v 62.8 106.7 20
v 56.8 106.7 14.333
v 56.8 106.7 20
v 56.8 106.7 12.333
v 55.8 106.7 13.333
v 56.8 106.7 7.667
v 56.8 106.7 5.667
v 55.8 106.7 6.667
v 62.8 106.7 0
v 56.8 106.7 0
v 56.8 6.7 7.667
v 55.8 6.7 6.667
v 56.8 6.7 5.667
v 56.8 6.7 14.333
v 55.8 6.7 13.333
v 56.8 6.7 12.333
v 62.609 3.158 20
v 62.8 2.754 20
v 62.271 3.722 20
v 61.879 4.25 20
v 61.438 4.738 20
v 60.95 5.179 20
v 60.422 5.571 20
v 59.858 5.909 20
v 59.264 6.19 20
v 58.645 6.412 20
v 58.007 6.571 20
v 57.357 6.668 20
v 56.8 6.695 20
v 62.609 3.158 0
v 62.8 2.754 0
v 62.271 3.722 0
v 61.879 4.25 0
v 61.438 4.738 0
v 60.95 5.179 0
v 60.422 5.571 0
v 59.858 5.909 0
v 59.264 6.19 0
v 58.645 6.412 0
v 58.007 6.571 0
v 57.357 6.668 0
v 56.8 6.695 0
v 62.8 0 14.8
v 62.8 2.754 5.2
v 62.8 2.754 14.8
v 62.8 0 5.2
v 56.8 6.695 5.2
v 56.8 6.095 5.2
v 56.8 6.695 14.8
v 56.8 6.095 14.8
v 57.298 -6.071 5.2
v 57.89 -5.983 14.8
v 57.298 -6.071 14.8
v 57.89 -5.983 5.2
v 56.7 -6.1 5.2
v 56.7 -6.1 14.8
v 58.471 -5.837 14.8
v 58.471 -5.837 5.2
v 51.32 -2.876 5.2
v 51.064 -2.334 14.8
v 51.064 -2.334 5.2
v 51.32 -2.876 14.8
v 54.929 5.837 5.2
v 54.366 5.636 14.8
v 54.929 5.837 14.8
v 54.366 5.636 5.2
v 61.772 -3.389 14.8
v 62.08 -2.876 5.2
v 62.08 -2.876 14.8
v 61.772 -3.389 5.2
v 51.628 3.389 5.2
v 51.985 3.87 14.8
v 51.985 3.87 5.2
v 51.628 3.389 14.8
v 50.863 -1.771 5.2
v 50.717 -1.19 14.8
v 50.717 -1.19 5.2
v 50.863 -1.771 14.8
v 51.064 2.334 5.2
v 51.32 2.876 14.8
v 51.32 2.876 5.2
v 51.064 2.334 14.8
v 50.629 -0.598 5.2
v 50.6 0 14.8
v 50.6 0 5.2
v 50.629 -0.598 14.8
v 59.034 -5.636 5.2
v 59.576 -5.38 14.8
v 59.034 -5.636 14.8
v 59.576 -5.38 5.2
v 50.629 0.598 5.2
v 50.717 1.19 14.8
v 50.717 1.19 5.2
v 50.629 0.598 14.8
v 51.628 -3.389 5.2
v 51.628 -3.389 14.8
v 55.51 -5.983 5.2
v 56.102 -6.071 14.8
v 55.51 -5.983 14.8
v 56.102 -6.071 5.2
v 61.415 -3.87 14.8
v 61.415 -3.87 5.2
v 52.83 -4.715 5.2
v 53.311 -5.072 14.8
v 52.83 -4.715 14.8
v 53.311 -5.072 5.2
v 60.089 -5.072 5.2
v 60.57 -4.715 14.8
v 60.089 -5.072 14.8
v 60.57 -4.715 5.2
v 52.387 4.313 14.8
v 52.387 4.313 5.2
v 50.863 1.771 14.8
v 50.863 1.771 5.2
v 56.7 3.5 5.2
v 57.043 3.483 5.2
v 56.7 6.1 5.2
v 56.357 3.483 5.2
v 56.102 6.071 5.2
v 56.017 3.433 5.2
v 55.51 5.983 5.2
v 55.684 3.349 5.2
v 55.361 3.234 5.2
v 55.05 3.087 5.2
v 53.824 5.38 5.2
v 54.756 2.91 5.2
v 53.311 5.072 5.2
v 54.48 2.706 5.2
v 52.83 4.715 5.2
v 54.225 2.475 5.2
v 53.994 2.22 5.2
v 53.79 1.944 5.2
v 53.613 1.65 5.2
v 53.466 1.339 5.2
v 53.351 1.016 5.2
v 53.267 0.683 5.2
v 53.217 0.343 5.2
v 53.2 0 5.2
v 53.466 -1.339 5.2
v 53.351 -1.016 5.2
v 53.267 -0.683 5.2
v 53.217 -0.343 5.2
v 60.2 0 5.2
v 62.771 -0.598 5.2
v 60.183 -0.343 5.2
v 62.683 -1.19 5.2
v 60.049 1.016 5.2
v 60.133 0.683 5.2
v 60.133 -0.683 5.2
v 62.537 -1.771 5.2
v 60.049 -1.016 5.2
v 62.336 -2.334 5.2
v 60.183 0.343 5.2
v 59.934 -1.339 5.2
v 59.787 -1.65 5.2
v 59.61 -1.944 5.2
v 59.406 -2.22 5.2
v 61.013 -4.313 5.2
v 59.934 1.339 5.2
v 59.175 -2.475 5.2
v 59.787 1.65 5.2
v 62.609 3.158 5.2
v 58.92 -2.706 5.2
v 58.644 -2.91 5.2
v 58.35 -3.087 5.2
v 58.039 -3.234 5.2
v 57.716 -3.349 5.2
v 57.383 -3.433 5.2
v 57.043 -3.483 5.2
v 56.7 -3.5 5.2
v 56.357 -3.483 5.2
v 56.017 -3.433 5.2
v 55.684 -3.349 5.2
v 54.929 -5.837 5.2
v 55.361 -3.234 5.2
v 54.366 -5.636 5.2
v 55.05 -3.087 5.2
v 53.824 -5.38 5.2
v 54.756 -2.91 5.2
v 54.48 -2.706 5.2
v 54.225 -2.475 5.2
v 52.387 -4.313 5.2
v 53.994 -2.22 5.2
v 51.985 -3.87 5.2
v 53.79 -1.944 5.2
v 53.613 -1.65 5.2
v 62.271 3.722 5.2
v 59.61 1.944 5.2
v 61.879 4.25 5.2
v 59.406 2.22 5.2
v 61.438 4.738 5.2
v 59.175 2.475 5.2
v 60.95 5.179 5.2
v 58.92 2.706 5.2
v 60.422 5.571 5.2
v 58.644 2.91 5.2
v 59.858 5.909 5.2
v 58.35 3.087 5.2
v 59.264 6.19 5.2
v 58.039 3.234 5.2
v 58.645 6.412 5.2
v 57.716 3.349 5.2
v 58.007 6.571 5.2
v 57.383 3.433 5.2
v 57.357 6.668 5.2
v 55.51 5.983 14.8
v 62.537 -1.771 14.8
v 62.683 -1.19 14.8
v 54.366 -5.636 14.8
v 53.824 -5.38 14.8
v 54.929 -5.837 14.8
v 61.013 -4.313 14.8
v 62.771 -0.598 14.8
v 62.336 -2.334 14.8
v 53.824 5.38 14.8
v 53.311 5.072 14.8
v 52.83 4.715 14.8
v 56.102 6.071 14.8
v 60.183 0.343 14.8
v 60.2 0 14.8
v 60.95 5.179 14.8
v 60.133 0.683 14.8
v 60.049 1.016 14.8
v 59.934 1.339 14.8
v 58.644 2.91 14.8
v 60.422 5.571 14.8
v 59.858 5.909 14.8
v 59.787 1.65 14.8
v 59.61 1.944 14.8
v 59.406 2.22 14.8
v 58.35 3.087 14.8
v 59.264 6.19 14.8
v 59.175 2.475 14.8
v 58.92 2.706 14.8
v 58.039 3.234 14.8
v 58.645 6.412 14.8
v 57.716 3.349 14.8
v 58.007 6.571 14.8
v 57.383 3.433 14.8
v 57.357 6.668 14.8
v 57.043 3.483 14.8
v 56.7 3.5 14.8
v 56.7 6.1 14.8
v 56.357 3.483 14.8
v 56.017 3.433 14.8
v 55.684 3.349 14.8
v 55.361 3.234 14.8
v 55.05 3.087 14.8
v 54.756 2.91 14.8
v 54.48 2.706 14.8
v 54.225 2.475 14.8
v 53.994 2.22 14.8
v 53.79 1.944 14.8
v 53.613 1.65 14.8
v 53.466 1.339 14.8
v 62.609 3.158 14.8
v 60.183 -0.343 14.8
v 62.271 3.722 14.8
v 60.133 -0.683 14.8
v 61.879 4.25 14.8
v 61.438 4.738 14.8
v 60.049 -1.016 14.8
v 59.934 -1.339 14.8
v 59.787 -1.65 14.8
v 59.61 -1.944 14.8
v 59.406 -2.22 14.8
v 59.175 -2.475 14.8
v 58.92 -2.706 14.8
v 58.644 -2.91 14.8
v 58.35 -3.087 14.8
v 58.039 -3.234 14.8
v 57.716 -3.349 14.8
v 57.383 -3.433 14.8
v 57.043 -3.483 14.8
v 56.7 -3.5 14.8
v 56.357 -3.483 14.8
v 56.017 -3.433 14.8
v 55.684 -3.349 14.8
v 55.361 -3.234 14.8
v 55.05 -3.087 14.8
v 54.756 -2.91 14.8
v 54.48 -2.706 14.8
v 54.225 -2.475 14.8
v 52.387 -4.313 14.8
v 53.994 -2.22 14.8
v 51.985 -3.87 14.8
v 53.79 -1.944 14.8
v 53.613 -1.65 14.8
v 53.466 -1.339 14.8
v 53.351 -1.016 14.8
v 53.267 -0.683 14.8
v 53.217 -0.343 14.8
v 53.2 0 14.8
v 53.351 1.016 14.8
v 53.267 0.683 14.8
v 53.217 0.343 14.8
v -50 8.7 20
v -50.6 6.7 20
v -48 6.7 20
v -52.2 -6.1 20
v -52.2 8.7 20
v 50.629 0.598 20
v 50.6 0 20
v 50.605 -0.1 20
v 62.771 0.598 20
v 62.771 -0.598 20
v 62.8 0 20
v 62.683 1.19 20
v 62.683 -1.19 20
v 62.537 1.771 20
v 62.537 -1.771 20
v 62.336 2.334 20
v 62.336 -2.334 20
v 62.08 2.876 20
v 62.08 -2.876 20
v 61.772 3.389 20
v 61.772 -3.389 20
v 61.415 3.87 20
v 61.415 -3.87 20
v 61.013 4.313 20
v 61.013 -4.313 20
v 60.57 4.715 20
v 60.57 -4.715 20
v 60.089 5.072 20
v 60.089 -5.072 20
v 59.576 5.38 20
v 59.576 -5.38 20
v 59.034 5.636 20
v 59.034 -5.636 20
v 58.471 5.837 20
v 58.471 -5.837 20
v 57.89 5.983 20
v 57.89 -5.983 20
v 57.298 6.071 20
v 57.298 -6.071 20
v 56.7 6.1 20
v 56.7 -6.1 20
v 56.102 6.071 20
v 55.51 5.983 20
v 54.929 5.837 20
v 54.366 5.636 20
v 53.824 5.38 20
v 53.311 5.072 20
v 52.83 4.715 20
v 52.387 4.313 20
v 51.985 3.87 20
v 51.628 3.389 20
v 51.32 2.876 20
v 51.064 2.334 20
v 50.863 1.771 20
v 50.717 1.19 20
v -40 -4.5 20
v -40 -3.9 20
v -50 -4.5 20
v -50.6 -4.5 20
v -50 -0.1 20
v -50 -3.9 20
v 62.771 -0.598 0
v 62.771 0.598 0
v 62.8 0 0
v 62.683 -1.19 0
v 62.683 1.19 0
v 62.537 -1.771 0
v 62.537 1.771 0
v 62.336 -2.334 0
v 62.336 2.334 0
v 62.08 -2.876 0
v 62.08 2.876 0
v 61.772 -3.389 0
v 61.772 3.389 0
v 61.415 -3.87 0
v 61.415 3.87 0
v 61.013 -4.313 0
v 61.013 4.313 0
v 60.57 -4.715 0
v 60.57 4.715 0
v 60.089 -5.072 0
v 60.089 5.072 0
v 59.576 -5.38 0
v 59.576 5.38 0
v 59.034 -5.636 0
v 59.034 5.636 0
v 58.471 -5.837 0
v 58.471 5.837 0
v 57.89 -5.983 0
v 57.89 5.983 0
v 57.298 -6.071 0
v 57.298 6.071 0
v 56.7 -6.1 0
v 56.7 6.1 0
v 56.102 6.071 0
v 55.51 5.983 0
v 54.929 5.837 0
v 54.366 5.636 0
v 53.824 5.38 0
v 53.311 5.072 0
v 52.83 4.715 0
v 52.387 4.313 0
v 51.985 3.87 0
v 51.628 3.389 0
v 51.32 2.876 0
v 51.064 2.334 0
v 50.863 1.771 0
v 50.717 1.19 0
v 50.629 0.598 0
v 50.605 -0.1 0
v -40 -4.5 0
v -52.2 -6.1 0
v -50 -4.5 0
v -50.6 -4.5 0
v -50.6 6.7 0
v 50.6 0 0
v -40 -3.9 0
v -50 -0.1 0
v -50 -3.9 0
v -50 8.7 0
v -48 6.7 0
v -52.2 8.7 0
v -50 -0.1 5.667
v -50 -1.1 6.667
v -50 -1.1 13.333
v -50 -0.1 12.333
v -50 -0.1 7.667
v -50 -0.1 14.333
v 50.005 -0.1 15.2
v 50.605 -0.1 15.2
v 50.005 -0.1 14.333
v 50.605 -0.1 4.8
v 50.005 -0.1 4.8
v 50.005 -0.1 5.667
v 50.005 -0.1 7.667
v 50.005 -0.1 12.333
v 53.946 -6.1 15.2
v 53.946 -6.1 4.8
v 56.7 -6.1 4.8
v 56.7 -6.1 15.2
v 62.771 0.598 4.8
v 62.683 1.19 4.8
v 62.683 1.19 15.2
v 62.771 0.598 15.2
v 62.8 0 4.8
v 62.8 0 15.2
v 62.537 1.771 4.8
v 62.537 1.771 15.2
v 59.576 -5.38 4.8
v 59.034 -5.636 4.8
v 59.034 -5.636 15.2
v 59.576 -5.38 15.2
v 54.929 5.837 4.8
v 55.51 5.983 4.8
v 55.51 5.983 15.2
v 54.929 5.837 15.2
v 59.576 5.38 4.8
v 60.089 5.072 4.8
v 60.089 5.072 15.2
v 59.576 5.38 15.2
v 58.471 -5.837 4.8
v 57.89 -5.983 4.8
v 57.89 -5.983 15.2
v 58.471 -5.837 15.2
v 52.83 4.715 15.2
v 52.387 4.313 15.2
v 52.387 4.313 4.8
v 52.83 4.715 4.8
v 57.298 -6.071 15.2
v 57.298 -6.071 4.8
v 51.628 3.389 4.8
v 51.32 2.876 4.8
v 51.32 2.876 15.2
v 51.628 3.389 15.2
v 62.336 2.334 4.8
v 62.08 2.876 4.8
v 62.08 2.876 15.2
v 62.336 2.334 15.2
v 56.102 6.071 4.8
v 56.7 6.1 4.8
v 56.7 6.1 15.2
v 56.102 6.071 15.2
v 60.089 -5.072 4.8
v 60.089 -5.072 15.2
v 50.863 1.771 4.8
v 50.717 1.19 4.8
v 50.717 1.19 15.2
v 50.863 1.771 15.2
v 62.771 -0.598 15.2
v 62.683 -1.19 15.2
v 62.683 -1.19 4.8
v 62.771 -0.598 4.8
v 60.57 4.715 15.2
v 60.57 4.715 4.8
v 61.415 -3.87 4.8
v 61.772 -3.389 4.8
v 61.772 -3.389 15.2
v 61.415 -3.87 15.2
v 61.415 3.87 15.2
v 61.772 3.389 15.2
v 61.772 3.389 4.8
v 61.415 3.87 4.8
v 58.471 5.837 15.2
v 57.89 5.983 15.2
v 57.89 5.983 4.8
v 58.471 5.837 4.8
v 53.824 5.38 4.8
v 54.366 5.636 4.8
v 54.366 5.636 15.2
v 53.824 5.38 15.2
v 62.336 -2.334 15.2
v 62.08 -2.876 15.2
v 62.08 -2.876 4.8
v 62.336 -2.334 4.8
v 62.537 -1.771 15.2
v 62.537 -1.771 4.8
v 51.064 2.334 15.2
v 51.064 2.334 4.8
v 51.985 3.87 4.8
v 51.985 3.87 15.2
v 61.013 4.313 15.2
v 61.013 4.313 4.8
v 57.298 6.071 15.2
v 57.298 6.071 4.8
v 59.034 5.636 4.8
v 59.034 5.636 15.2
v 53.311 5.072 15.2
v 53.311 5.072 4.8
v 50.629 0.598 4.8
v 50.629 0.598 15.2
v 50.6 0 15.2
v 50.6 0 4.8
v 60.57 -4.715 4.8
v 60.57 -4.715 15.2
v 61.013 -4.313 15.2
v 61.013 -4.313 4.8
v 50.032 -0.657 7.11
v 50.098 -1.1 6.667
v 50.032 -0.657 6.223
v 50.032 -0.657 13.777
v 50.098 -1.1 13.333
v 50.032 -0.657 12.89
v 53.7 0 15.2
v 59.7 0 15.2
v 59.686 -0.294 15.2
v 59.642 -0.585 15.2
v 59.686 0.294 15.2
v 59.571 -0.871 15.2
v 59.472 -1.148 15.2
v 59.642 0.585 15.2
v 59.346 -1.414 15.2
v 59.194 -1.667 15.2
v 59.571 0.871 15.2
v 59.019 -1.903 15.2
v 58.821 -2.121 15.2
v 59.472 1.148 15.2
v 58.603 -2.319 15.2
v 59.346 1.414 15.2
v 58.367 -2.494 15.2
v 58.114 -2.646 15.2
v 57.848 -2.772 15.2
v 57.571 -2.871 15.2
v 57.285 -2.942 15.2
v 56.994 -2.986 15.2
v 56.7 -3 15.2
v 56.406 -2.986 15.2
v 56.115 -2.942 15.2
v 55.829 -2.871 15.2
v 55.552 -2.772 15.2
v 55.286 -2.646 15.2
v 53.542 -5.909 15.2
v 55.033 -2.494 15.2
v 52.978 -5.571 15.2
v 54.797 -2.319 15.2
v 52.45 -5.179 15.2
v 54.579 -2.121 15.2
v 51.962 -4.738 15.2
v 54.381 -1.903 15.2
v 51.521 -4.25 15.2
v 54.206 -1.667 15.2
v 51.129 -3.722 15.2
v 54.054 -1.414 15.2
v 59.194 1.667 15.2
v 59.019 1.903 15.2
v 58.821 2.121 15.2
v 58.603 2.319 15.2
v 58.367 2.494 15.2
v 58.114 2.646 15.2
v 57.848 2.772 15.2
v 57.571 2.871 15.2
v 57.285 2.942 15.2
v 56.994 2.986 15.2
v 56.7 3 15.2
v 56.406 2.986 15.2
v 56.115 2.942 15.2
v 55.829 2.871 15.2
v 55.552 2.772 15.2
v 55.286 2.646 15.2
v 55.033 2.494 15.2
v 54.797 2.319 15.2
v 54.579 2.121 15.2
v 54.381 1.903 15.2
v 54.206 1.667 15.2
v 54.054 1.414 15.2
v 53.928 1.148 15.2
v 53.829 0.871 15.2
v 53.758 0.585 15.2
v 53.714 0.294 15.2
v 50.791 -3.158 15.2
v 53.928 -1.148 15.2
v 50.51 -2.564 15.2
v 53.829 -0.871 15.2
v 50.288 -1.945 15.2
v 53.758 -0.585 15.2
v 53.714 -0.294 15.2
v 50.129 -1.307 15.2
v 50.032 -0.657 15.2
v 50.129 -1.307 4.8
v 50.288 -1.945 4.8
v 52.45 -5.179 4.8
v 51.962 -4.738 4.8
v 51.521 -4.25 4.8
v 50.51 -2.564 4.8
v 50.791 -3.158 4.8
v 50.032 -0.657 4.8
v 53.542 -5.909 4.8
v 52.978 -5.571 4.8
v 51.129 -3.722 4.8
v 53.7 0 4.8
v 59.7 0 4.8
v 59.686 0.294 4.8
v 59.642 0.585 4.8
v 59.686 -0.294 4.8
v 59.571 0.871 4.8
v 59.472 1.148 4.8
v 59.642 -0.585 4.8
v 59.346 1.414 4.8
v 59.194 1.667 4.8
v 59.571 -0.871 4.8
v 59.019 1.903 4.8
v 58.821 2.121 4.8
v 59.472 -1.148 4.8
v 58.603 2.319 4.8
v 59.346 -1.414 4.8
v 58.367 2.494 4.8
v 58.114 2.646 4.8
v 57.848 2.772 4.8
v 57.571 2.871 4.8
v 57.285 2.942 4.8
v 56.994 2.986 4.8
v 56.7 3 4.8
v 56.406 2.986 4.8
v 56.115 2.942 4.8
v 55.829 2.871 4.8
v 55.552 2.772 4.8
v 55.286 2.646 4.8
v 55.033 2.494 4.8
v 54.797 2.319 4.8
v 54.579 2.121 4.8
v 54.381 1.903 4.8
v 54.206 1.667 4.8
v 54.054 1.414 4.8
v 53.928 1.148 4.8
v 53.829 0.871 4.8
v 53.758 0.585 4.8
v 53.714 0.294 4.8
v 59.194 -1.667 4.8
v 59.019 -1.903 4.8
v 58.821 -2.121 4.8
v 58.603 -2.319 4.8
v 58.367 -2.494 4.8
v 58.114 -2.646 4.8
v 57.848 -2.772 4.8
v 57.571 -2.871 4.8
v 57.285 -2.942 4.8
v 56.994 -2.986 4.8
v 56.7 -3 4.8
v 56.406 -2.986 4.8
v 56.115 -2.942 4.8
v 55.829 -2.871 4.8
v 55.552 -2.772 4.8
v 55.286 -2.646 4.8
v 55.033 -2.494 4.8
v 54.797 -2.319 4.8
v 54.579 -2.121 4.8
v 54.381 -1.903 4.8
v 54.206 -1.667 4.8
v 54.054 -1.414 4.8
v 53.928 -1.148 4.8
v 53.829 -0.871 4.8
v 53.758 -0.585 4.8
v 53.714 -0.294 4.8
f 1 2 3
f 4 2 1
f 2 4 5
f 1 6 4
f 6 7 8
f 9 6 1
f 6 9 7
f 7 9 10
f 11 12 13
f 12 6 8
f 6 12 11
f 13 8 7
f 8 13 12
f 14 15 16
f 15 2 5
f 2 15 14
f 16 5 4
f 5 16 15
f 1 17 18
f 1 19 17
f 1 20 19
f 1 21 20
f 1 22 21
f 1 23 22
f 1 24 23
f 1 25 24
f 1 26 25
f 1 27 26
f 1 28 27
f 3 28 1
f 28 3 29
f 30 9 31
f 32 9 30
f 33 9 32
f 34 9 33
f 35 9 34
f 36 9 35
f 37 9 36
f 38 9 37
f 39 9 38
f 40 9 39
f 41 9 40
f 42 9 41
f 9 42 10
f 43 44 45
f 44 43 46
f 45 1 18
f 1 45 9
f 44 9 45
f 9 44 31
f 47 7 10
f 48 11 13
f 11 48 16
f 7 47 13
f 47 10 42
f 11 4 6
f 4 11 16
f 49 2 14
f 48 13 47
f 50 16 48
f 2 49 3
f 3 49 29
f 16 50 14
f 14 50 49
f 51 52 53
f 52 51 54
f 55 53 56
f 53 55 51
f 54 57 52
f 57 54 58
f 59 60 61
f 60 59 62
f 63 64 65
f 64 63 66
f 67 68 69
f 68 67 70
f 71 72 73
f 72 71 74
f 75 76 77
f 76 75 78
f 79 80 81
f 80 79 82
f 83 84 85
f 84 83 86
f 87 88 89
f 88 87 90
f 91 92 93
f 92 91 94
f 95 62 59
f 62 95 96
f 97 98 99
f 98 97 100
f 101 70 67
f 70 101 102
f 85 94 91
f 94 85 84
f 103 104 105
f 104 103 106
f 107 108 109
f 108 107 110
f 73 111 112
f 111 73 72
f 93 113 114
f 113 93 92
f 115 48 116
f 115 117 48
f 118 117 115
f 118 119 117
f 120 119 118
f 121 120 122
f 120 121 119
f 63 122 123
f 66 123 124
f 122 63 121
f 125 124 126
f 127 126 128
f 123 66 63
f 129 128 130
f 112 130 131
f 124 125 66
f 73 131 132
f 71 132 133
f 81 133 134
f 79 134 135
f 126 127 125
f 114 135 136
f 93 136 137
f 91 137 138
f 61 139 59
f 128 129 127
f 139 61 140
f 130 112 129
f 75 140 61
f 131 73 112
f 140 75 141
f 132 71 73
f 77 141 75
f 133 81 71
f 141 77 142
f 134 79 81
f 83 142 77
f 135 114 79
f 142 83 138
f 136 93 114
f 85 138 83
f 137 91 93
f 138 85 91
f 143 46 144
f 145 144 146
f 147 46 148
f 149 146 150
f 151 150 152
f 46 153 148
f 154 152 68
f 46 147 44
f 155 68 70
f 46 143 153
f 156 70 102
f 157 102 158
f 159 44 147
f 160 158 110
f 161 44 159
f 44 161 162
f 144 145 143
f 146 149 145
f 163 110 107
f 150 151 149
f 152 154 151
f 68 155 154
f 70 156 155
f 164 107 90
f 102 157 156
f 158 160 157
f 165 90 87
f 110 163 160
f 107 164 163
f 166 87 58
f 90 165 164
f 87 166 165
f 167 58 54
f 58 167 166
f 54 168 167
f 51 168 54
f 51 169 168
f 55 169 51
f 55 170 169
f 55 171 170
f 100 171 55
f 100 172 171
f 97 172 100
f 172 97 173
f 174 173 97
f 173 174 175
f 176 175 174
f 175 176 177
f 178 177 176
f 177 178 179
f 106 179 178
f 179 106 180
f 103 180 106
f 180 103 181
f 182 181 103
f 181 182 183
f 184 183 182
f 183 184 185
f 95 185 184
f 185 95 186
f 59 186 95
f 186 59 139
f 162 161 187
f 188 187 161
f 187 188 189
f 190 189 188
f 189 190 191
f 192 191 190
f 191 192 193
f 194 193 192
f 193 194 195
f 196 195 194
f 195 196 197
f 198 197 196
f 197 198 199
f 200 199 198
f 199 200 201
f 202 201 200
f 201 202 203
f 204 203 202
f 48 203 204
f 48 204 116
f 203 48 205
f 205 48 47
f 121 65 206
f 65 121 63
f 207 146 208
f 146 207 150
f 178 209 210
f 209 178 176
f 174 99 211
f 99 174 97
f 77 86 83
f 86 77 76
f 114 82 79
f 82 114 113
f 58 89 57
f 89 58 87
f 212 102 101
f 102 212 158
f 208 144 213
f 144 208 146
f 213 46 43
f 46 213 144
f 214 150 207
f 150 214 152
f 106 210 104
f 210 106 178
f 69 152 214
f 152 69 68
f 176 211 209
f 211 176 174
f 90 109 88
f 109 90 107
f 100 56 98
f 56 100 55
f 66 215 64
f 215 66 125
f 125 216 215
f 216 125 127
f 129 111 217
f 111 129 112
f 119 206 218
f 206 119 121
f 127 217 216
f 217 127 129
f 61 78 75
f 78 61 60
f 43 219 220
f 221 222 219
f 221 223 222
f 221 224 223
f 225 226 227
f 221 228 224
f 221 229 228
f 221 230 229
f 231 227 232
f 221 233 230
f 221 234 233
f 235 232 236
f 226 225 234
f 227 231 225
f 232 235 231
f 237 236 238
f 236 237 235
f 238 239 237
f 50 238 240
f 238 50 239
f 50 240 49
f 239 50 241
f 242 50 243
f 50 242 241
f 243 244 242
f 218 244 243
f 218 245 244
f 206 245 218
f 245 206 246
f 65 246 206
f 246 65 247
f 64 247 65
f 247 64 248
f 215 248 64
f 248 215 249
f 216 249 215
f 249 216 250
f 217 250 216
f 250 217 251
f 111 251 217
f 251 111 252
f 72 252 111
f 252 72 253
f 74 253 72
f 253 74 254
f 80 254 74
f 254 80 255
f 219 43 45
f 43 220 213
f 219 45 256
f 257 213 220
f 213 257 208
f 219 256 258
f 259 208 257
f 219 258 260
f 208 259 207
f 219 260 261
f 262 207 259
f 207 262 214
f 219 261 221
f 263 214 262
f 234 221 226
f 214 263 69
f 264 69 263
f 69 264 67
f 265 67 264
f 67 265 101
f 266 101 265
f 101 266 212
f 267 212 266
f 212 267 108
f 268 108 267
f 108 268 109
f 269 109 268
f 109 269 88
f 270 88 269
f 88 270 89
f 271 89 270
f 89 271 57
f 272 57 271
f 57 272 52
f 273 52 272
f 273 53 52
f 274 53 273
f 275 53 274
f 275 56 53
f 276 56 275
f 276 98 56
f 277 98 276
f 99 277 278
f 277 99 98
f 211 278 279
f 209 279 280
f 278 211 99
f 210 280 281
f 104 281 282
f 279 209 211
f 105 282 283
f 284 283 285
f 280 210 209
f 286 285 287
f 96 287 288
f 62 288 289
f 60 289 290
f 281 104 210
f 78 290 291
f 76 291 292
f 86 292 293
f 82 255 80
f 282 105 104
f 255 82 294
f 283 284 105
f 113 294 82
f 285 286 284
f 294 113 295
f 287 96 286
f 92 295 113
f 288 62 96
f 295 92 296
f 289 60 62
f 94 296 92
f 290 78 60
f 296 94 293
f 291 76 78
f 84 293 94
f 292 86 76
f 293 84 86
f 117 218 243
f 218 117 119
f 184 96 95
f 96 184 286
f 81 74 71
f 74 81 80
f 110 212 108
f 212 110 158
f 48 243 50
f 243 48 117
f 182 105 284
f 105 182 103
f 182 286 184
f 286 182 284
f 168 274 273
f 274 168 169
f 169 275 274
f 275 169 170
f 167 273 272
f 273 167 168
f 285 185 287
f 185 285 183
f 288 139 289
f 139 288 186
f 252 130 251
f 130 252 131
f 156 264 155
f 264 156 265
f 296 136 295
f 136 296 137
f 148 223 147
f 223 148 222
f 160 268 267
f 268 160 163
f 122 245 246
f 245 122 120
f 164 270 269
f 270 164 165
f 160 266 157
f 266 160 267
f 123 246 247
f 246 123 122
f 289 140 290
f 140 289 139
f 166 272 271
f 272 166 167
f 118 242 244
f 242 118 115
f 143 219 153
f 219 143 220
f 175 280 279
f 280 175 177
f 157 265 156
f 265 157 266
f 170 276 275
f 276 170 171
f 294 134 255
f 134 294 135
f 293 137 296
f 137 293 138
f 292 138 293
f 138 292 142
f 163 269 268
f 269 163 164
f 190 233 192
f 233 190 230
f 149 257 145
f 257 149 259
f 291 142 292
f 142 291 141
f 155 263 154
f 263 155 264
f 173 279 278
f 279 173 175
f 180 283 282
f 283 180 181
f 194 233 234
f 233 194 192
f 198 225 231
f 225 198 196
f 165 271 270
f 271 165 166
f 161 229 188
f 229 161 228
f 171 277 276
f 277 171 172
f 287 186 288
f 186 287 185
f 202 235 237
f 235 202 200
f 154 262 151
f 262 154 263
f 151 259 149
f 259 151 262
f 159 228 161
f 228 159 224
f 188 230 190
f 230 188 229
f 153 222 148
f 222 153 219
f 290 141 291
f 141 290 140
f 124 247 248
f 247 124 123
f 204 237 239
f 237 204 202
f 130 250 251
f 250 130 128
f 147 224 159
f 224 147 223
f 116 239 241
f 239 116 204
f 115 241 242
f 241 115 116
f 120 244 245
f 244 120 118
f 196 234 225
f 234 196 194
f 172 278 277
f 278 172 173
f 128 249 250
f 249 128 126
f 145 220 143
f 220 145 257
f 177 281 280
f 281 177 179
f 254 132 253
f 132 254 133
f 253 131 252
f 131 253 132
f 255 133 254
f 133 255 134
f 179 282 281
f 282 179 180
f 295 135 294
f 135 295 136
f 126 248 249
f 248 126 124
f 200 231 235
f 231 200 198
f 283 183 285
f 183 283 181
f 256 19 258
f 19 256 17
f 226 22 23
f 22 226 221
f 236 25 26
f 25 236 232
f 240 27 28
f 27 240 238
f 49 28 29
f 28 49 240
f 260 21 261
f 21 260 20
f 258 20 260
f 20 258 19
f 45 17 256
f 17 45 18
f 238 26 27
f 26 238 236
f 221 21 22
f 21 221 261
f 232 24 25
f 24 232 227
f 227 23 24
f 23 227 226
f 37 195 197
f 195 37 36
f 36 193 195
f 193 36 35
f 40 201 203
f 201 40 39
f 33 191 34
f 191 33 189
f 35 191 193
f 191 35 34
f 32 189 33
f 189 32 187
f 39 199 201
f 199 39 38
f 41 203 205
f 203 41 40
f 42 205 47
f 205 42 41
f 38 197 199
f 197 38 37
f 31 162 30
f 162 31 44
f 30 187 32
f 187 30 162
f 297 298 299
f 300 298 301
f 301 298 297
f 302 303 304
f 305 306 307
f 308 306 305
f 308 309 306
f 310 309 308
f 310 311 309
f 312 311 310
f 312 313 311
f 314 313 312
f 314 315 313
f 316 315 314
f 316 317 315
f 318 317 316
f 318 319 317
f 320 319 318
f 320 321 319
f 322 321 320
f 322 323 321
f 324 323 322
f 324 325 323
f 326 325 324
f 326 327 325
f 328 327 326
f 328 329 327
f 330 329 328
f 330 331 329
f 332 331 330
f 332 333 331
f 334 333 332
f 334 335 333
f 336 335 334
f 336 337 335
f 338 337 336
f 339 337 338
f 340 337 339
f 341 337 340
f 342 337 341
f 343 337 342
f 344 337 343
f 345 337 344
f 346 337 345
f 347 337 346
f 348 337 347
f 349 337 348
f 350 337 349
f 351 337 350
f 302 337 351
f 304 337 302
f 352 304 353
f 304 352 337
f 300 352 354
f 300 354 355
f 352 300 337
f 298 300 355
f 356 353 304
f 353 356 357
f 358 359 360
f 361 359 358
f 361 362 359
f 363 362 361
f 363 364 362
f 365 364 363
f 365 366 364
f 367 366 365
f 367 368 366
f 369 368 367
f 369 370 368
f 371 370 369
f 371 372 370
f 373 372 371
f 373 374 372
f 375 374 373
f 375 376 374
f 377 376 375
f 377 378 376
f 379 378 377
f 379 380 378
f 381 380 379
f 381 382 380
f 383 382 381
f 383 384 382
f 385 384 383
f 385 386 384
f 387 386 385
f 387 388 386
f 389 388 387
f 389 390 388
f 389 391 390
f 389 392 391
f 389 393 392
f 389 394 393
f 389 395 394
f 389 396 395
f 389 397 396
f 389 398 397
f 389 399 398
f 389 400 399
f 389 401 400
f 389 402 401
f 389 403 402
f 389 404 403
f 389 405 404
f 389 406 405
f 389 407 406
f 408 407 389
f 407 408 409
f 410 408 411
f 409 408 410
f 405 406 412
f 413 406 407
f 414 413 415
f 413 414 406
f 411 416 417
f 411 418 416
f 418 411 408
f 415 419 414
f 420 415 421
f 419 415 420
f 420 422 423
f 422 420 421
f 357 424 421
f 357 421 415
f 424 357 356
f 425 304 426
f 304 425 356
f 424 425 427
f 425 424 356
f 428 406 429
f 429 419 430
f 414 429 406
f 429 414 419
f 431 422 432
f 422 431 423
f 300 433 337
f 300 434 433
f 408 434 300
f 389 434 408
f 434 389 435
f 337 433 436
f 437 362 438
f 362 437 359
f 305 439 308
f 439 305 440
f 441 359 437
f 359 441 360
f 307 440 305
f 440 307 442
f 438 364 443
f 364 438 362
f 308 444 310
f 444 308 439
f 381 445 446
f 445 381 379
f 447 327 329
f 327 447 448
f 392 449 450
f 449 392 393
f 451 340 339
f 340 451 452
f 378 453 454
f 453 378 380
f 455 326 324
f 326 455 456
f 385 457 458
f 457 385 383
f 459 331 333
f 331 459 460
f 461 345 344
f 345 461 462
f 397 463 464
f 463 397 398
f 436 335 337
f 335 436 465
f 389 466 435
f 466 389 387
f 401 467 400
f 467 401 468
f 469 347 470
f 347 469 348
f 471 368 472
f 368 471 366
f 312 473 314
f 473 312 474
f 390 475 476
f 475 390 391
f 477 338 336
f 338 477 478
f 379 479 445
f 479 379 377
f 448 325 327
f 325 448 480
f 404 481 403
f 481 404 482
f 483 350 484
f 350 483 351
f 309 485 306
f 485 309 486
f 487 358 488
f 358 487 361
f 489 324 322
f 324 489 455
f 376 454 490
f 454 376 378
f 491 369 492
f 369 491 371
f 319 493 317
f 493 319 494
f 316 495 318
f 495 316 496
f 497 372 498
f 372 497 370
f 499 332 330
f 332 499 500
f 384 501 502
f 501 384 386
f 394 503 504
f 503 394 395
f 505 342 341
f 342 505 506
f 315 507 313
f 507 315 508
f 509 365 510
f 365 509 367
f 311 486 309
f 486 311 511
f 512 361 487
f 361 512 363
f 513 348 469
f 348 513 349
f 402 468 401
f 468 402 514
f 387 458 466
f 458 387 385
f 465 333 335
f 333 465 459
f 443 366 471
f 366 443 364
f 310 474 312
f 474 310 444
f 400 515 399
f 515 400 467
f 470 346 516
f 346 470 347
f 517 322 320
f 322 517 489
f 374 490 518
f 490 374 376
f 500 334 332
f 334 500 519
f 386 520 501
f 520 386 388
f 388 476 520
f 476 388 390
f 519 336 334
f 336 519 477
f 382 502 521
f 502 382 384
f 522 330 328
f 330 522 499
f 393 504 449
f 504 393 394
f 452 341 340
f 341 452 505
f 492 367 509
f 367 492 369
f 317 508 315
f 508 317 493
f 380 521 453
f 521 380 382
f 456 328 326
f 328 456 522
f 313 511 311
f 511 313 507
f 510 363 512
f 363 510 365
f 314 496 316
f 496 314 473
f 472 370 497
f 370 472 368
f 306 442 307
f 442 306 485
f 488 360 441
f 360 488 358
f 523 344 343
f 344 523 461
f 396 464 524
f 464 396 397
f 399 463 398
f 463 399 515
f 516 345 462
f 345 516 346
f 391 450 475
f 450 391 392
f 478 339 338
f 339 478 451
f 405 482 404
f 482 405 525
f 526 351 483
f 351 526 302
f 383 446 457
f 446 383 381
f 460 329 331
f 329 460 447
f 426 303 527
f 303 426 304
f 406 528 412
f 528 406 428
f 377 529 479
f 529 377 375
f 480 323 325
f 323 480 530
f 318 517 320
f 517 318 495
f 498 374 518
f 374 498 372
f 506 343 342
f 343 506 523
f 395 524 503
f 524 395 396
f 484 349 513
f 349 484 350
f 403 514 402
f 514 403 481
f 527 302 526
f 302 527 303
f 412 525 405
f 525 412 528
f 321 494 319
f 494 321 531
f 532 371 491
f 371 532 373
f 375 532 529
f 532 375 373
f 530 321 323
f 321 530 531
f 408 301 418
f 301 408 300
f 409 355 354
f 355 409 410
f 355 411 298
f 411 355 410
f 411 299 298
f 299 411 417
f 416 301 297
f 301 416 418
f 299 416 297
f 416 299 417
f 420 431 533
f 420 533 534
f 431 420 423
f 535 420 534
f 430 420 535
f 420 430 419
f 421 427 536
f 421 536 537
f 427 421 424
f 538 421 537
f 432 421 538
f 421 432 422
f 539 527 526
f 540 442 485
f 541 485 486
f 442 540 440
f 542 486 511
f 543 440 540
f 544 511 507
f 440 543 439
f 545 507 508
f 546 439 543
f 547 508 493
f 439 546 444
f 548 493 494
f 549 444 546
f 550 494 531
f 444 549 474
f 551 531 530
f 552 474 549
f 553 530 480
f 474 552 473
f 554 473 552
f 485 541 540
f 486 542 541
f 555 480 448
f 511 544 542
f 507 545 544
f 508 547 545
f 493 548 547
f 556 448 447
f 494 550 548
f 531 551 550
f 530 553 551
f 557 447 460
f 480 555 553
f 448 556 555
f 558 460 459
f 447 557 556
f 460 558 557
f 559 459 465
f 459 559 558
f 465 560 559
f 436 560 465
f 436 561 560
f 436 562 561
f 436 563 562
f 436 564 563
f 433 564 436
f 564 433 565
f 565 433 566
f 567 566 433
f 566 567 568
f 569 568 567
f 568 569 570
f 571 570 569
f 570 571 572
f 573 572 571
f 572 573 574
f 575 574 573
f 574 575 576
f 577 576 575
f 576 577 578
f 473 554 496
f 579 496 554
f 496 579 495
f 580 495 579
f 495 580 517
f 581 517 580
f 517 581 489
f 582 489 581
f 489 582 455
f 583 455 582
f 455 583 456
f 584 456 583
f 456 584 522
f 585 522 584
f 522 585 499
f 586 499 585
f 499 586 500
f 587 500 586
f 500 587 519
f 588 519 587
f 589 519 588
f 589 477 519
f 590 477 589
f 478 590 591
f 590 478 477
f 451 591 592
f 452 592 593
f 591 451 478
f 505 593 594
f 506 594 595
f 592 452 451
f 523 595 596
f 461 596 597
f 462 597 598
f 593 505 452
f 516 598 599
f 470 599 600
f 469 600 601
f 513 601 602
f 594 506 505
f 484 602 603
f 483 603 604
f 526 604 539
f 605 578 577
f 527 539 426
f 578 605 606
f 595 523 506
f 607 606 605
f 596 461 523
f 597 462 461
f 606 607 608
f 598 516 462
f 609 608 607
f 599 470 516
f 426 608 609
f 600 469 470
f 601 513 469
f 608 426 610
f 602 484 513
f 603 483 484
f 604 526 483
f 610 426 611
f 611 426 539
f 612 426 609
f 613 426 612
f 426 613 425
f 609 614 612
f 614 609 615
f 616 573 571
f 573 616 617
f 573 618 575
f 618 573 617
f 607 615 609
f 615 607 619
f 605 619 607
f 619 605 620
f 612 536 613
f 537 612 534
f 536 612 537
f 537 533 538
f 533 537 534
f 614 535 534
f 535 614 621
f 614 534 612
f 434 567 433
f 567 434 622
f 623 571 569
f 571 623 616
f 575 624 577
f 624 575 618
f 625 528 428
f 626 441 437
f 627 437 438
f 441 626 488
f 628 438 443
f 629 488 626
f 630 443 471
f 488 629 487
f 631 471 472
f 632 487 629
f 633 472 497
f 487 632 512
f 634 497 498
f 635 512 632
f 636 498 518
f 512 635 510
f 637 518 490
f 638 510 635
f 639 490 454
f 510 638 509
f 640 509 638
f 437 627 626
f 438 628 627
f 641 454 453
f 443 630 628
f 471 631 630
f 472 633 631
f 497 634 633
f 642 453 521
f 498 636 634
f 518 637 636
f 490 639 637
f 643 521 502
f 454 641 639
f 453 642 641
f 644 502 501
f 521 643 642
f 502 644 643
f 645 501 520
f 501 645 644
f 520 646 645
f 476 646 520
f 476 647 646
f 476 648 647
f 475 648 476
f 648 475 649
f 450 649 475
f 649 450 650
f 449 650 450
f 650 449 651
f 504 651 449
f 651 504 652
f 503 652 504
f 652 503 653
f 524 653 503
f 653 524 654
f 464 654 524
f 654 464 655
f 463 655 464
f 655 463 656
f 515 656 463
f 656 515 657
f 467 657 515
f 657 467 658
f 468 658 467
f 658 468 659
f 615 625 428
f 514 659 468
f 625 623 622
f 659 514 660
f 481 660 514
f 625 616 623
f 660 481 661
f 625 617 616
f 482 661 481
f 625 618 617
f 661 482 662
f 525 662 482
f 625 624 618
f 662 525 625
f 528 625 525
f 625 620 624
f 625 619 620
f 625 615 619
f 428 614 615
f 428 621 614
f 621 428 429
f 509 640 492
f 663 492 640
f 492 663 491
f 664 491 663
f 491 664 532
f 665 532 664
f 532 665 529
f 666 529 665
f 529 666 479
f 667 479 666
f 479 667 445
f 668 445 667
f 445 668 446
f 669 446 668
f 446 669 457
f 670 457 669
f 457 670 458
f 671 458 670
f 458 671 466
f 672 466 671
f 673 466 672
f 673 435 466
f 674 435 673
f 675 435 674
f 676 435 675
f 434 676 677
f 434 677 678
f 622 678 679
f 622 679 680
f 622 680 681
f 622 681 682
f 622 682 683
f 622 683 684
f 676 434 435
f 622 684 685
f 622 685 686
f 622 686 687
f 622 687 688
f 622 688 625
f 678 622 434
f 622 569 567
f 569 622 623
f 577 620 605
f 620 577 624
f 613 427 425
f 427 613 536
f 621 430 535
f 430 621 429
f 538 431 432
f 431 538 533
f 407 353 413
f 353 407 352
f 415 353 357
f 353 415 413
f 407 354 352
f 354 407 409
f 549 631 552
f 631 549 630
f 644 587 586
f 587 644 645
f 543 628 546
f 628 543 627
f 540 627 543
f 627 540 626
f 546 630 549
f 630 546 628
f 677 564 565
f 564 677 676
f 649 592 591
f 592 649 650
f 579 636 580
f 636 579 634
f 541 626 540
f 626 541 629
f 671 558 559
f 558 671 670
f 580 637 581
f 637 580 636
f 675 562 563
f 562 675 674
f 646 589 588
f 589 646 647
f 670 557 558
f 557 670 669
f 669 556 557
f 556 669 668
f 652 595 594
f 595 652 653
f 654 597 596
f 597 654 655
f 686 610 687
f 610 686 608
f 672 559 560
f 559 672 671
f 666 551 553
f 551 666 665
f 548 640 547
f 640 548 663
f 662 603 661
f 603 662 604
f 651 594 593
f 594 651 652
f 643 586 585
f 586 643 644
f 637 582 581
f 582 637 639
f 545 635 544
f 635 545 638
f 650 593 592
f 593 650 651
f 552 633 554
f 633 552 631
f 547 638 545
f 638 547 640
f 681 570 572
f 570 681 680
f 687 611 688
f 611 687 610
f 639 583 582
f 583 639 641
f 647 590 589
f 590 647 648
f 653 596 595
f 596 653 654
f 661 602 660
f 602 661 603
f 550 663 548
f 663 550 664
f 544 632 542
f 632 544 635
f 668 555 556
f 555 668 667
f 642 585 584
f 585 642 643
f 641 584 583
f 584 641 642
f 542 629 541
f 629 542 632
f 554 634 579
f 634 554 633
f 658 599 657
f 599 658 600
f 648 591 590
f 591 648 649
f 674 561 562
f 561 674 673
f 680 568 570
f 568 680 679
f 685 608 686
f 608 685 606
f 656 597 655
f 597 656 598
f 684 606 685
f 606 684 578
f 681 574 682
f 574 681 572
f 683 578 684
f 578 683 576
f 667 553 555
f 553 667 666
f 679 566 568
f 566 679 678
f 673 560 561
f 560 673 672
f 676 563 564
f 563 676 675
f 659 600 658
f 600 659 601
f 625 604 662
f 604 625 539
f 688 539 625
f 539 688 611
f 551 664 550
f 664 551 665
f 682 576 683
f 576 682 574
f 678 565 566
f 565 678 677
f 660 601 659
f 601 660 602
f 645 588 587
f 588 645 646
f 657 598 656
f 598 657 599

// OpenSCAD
//!OpenSCAD

// The useable length of the Clip
Clip_Length = 100;
// The height of the clip
Clip_Height = 20;
// The thickness of one of the two arms
Arm_Thickness = 6;

// Your extrusion width (Width of the molten plastic trace of your nozzle - Usally your nozzle diameter)
Extrusion_Width = 0.4;
// Your layer height
Layer_Height = 0.2;

// The amount of noses and slots to create
Amount_Noses = 2;
// The length how far a nose is standing out
Noses_Size = 1;

// The angle how far the clip is opened
Opening_Angle = 90;

// How much the clip has to be bowed to snap (I recommend 2mm for PLA and 3mm for ABS)
Clip_Overstand = 2;

//Circle Resolution
$fn = 64;

translate([0,0,Clip_Height/2])
union() {
    // Upper part
    translate([Clip_Length/2 + Arm_Thickness + 1.75*Extrusion_Width, 0, 0])
        rotate([0, 0, -Opening_Angle])
            translate([-Clip_Length/2 - Arm_Thickness - 1.75*Extrusion_Width, 0, 0])
                difference() {
                    union() {
                        translate([(Arm_Thickness + 1.75*Extrusion_Width)/2, Arm_Thickness/2 + Extrusion_Width/4, 0])
                            cube([Clip_Length + Arm_Thickness + 1.75*Extrusion_Width, Arm_Thickness, Clip_Height], center=true);
    
                        for(i = [1 : 1 : Amount_Noses]) 
                            translate([0, Extrusion_Width/4, -Clip_Height/2 + i*Clip_Height/(Amount_Noses + 1)])
                                rotate([45,0,0])
                                    cube([Clip_Length, sqrt(2)*Noses_Size, sqrt(2)*Noses_Size], center=true);
    
                        translate([Clip_Length/2 + Arm_Thickness + 1.75*Extrusion_Width, 0, 0])
                            cylinder(r = Arm_Thickness + Extrusion_Width/4, h = Clip_Height/2-2*Layer_Height, center=true);
                    }
                    
                    translate([Clip_Length/2 + Arm_Thickness + 1.75*Extrusion_Width, 0, 0])
                        cylinder(r = Arm_Thickness/2 + 1.25*Extrusion_Width, h = Clip_Height/2-2*Layer_Height, center=true);
                    
                    translate([Clip_Length/2 + Arm_Thickness + 1.75*Extrusion_Width, 0, 0.375*Clip_Height - Layer_Height/2])
                            cylinder(r = Arm_Thickness + 1.75*Extrusion_Width, h = Clip_Height/4 + Layer_Height, center=true);
                    
                    translate([Clip_Length/2 + Arm_Thickness + 1.75*Extrusion_Width, 0, -0.375*Clip_Height + Layer_Height/2])
                            cylinder(r = Arm_Thickness + 1.75*Extrusion_Width, h = Clip_Height/4 + Layer_Height, center=true);
                }
    
    // Lower part
    difference() {
        union() {
            translate([(Arm_Thickness + 1.75*Extrusion_Width)/2, -Arm_Thickness/2 - Extrusion_Width/4, 0])
                cube([Clip_Length + Arm_Thickness + 1.75*Extrusion_Width, Arm_Thickness, Clip_Height], center=true);
            
            translate([Clip_Length/2 + Arm_Thickness + 1.75*Extrusion_Width, 0, 0])
                cylinder(r = Arm_Thickness + Extrusion_Width/4, h = Clip_Height, center=true);
            
            translate([-(Clip_Length + 5.5*Extrusion_Width)/2, -Arm_Thickness + 1.75*Extrusion_Width, 0])
                cube([5.5*Extrusion_Width, 4*Extrusion_Width, Clip_Height], center=true);
            
            translate([-Clip_Length/2 - 3.5*Extrusion_Width, 0.75*Extrusion_Width, 0])
                cube([4*Extrusion_Width, 2*Arm_Thickness + 2*Extrusion_Width, Clip_Height], center=true);
            
            translate([-Clip_Length/2 - 5.5*Extrusion_Width, Arm_Thickness + 1.75*Extrusion_Width , 0])
                polyhedron( points = [
                                [0, 0, -Clip_Height/2], 
                                [Clip_Overstand + 5.5*Extrusion_Width, 0, -Clip_Height/2], 
                                [5.5*Extrusion_Width, Clip_Overstand, -Clip_Height/2], 
                                [0, Clip_Overstand, -Clip_Height/2], 
                                [0, 0, Clip_Height/2], 
                                [Clip_Overstand + 5.5*Extrusion_Width, 0, Clip_Height/2], 
                                [5.5*Extrusion_Width, Clip_Overstand, Clip_Height/2], 
                                [0, Clip_Overstand, Clip_Height/2]], 
                            triangles = [[0,1,2],[0,2,3],[4,7,6],[4,6,5],[0,4,5],[0,5,1],[1,5,6],[1,6,2],[2,6,7],[2,7,3],[3,7,4],[3,4,0]], convexity = 10);
        }
        
        for(i = [1 : 1 : Amount_Noses]) 
            translate([Extrusion_Width/4, -Extrusion_Width/4, -Clip_Height/2 + i*Clip_Height/(Amount_Noses + 1)])
                rotate([45,0,0])
                    cube([Clip_Length + Extrusion_Width/2, sqrt(2)*Noses_Size, sqrt(2)*Noses_Size], center=true);
        
        translate([Clip_Length/2 + Arm_Thickness + 1.75*Extrusion_Width, 0, 0])
            cylinder(r = Arm_Thickness + 1.75*Extrusion_Width, h = Clip_Height/2+2*Layer_Height, center=true);
        
        translate([-Clip_Length/2 + Clip_Height/4, -Arm_Thickness + 4.5*Extrusion_Width, 0])
            cube([Clip_Height/2, 1.5*Extrusion_Width, Clip_Height], center=true);
    }
    
    //Axle
    translate([Clip_Length/2 + Arm_Thickness + 1.75*Extrusion_Width, 0, 0])
            cylinder(r = Arm_Thickness/2, h = Clip_Height, center=true);
}
